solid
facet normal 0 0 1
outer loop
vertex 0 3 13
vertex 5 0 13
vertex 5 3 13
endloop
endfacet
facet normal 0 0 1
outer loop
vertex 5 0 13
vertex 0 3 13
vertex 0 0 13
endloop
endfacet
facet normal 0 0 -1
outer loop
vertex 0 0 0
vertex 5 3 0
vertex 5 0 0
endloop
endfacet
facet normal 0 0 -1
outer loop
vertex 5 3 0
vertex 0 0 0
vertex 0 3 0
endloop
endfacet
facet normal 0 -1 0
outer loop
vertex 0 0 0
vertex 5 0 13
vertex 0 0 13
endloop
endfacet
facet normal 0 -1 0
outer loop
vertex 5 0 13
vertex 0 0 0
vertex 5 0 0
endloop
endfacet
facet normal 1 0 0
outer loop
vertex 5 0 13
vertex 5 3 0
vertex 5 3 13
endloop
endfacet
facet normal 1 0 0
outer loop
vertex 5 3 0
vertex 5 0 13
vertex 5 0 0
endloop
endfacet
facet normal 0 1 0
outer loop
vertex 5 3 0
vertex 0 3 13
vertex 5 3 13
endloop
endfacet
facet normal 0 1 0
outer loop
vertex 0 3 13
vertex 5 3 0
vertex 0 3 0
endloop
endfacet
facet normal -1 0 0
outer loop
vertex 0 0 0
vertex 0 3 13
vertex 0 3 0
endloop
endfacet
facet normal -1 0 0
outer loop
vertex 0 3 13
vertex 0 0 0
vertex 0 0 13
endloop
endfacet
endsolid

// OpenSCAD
// Generated by SolidPython 1.0.1 on 2020-07-29 00:46:54


cube(size = [5, 3, 13]);
/***********************************************
*********      SolidPython code:      **********
************************************************
 
# import packages: SolidPython
from solid import *
from solid.utils import *
from itertools import chain, combinations, permutations


class Resize:

    def __init__(self, scad_file):
        self.scad_file = scad_file
        #self.scad_file = import_scad(scad_file)
        # cone/cylinder param:
        self.r1 = 0
        self.r2 = 0
        self.h = 0
        # rectangular prism param:
        self.w = 0
        self.l = 0
        # ellipse param:
        self.r = 0

    # import OpenScad code (file name corresponds to shape)


    # classify shape + parameters
    def assign(self, param1, param2, param3):
        if self.scad_file == 'cone.scad':
            self.r1 = param1
            self.r2 = param2
            self.h = param3
        elif self.scad_file == 'cylinder.scad':
            self.r1 = param1
            self.r2 = param2
            self.h = param3
        elif self.scad_file == 'rectangularPrism.scad':
            self.h = param1
            self.l = param2
            self.w = param3
        else:
            self.r = param1
            self.h = param2

    # resize parameters
    def iterate(self):
        x = range(3, 20, 2)
        i = 1
        if self.scad_file == 'cone.scad':
            tempList = list(permutations(x, 2))
            for temp in tempList:
                param1 = temp[0]
                param2 = temp[1]
                filepath = 'produced_scad_files/' + 'cone' + str(param1) + '_' + str(param2) + '_' + '.scad'
                scad_render_to_file(cylinder(h=param1, r1=param2, r2=0), filepath)

        elif self.scad_file == 'cylinder.scad':
            tempList = list(permutations(x, 3))
            for temp in tempList:
                param1 = temp[0]
                param2 = temp[1]
                filepath = 'produced_scad_files/' + 'cylinder' + str(param1) + '_' + str(param2) + '_' + '.scad'
                scad_render_to_file(cylinder(h=param1, r1=param2, r2=param2), filepath)

        elif self.scad_file == 'rectangularPrism.scad':
            tempList = list(permutations(x, 3))
            for temp in tempList:
                param1 = temp[0]
                param2 = temp[1]
                param3 = temp[2]
                filepath = 'produced_scad_files/' + 'rectangularPrism' + str(param1) + '_' + str(param2) + '_' + str(
                    param3) + '.scad'
                scad_render_to_file(cube(size=(param1, param2, param3)), filepath)

        elif self.scad_file == 'ellipse.scad':
            tempList = list(permutations(x, 4))
            for temp in tempList:
                param1 = temp[0]
                param2 = temp[1]
                param3 = temp[2]
                param4 = temp[3]
                filepath = 'produced_scad_files/' + 'ellipse' + str(param1) + '_' + str(param2) + '_' + str(param3) + '_' + str(param4) + '.scad'
                scad_render_to_file(scale([param1, param2, param3])(sphere(r=param4)), filepath)

    def render_to_scadfile(self):
        scad_render_to_file(scad, 'example.scad') 
 
************************************************/
